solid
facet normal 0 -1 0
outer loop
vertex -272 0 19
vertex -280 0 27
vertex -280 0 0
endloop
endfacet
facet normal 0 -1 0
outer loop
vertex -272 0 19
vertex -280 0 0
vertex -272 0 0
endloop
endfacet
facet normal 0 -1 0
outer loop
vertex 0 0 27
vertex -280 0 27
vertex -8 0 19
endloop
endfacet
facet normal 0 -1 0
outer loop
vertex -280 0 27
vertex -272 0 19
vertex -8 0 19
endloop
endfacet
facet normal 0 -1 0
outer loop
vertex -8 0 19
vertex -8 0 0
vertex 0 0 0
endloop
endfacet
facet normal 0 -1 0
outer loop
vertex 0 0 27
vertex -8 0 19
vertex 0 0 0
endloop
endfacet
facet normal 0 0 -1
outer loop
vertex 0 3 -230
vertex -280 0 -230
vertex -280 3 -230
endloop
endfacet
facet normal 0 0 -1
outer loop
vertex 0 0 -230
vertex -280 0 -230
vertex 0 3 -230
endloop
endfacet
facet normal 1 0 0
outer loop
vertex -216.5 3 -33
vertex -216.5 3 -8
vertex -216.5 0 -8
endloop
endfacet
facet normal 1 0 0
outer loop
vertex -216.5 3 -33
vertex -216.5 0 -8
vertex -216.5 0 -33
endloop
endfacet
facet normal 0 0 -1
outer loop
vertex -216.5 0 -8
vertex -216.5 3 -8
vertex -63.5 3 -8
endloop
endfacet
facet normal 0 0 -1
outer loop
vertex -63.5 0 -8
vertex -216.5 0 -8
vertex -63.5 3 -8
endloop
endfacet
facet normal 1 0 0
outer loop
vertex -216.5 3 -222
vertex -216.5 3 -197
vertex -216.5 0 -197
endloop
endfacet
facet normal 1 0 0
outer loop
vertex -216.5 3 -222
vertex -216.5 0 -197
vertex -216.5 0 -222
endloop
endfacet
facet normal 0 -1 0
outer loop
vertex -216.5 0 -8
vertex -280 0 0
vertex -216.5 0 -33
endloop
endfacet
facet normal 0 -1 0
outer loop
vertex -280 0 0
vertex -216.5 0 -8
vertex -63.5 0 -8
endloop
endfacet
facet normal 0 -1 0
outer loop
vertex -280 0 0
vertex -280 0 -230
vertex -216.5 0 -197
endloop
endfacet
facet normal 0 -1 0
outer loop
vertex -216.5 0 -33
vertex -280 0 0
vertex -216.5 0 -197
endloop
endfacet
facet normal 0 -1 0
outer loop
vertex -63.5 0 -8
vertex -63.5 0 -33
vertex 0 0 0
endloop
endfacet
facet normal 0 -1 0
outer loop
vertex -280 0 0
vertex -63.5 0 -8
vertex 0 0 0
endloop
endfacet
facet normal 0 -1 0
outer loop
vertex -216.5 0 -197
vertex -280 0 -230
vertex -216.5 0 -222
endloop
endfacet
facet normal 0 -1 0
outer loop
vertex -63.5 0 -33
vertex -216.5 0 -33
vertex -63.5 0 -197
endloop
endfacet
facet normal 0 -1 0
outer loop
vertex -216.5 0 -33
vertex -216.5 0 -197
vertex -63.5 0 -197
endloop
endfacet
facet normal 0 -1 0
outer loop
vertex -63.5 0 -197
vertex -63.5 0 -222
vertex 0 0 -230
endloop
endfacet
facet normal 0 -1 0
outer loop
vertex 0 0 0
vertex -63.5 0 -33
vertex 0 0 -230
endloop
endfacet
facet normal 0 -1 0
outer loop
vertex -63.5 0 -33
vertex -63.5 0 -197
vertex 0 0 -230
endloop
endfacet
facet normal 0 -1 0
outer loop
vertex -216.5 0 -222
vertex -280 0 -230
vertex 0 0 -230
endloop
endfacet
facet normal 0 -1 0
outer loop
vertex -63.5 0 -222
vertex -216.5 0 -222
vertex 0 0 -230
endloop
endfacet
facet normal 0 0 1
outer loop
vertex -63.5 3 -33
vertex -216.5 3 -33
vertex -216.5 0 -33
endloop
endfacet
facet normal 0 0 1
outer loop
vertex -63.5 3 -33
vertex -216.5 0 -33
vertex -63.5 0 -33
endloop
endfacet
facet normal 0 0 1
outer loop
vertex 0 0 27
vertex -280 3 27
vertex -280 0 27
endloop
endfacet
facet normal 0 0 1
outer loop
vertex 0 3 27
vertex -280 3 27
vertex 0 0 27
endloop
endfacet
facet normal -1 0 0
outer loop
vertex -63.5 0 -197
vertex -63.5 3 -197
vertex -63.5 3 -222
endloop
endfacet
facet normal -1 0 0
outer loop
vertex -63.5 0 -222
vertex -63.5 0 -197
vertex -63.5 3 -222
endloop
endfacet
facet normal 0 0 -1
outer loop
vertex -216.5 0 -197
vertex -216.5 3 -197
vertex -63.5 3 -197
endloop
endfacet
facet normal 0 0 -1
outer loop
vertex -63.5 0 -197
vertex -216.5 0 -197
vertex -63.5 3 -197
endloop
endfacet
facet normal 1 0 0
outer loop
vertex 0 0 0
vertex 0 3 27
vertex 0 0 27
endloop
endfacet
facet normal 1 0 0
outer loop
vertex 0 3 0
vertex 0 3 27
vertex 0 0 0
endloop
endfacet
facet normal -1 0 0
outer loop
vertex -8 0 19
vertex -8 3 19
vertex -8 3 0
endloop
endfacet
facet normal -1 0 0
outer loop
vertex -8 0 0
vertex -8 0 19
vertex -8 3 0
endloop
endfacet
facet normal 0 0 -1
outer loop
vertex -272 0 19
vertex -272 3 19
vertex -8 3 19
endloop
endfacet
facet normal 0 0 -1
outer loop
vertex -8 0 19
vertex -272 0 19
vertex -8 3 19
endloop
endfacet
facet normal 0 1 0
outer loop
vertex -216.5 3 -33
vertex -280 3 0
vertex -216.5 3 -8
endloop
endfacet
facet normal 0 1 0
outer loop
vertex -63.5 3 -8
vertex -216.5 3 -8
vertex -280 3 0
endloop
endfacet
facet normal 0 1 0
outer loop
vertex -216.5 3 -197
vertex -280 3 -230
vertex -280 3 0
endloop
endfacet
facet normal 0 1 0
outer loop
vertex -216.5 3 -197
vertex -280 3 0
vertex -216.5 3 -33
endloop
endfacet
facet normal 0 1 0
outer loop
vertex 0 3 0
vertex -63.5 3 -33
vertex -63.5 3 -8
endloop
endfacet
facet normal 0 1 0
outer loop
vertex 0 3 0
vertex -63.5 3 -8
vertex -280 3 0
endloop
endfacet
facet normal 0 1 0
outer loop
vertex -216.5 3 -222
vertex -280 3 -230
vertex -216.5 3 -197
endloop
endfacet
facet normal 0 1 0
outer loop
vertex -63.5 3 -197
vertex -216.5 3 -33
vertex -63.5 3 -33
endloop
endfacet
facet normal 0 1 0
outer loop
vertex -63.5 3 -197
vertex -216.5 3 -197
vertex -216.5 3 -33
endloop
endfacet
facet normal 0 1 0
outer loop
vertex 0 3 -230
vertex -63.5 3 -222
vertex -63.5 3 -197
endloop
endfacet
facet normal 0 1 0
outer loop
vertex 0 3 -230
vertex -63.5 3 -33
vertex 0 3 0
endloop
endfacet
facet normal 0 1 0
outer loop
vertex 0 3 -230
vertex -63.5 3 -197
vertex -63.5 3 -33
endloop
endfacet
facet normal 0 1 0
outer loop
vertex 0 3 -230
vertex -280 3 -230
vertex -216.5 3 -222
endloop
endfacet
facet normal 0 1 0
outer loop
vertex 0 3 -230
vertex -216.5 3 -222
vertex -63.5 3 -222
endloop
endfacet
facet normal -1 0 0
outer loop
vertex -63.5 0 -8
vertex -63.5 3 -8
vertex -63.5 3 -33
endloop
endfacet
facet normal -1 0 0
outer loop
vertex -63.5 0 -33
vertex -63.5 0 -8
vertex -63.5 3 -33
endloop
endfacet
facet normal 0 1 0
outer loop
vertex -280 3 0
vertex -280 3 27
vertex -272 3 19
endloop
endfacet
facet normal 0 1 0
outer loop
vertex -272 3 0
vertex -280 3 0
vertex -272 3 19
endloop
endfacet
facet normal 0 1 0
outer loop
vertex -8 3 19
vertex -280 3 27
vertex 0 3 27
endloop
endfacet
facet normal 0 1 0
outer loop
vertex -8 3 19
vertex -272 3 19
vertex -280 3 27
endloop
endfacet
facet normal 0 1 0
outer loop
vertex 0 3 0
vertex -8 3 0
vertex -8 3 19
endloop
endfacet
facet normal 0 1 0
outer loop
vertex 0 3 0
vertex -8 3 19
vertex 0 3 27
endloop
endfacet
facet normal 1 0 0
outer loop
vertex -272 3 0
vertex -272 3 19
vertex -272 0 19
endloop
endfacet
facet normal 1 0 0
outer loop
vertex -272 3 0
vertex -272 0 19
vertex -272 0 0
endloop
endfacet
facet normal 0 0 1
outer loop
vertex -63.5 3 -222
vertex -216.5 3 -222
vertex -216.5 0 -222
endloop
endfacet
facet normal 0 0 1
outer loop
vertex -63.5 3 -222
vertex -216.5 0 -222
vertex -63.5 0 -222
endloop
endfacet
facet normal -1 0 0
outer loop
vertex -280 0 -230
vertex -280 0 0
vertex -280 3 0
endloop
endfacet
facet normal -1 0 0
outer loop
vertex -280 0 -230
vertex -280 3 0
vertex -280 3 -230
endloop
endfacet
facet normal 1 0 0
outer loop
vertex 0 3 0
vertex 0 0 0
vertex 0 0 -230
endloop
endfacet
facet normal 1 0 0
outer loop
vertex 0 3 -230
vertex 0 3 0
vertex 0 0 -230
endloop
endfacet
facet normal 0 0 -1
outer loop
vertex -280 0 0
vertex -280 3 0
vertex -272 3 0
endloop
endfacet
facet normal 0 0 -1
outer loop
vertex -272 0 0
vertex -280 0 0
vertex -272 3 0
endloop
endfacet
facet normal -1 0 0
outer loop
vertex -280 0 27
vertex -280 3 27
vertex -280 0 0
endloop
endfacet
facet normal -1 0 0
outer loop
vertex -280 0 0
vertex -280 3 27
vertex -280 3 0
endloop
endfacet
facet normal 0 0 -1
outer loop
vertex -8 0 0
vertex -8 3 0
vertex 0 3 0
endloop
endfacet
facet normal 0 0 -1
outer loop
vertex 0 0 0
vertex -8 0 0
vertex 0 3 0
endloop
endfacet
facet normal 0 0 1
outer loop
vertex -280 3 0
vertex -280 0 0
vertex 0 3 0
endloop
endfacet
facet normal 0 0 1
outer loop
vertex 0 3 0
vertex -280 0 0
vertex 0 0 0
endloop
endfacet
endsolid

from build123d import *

# Parameters (mm, degrees)
SKETCH1_W           = 280
SKETCH1_H           = 230
BOSS_EXTRUDE1_DEPTH = 3
SKETCH4_W           = 153
SKETCH4_H           = 25
CUT_EXTRUDE2_DEPTH  = 363.365837242
SKETCH5_W           = 280
SKETCH5_H           = 27
BOSS_EXTRUDE2_DEPTH = 3
SKETCH7_W           = 264
SKETCH7_H           = 19
CUT_EXTRUDE4_DEPTH  = 363.365837242


with BuildPart() as part:
    # Sketch1 → Boss-Extrude1 (new body)
    with BuildSketch(Plane(origin=(0, 0, 0), x_dir=(1, 0, 0), z_dir=(0, 1, 0))):
        with Locations((-140, 115)):
            Rectangle(SKETCH1_W, SKETCH1_H)
    extrude(amount=BOSS_EXTRUDE1_DEPTH)

    # Sketch4 → Cut-Extrude2 (cut, through all)
    with BuildSketch(Plane(origin=(0, 3, 0), x_dir=(1, 0, 0), z_dir=(0, 1, 0))):
        with Locations((-140, 209.5)):
            Rectangle(SKETCH4_W, SKETCH4_H)
        with Locations((-140, 20.5)):
            Rectangle(SKETCH4_W, SKETCH4_H)
    extrude(amount=-CUT_EXTRUDE2_DEPTH, mode=Mode.SUBTRACT)


with BuildPart() as body_2:
    # Sketch5 → Boss-Extrude2 (new body)
    with BuildSketch(Plane(origin=(0, 3, 0), x_dir=(1, 0, 0), z_dir=(0, 1, 0))):
        with Locations((-140, -13.5)):
            Rectangle(SKETCH5_W, SKETCH5_H)
    extrude(amount=-BOSS_EXTRUDE2_DEPTH)

    # Sketch7 → Cut-Extrude4 (cut, through all)
    with BuildSketch(Plane(origin=(0, 3, 0), x_dir=(1, 0, 0), z_dir=(0, 1, 0))):
        with Locations((-140, -9.5)):
            Rectangle(SKETCH7_W, SKETCH7_H)
    extrude(amount=-CUT_EXTRUDE4_DEPTH, mode=Mode.SUBTRACT)


solid = Compound([part.part, body_2.part])
